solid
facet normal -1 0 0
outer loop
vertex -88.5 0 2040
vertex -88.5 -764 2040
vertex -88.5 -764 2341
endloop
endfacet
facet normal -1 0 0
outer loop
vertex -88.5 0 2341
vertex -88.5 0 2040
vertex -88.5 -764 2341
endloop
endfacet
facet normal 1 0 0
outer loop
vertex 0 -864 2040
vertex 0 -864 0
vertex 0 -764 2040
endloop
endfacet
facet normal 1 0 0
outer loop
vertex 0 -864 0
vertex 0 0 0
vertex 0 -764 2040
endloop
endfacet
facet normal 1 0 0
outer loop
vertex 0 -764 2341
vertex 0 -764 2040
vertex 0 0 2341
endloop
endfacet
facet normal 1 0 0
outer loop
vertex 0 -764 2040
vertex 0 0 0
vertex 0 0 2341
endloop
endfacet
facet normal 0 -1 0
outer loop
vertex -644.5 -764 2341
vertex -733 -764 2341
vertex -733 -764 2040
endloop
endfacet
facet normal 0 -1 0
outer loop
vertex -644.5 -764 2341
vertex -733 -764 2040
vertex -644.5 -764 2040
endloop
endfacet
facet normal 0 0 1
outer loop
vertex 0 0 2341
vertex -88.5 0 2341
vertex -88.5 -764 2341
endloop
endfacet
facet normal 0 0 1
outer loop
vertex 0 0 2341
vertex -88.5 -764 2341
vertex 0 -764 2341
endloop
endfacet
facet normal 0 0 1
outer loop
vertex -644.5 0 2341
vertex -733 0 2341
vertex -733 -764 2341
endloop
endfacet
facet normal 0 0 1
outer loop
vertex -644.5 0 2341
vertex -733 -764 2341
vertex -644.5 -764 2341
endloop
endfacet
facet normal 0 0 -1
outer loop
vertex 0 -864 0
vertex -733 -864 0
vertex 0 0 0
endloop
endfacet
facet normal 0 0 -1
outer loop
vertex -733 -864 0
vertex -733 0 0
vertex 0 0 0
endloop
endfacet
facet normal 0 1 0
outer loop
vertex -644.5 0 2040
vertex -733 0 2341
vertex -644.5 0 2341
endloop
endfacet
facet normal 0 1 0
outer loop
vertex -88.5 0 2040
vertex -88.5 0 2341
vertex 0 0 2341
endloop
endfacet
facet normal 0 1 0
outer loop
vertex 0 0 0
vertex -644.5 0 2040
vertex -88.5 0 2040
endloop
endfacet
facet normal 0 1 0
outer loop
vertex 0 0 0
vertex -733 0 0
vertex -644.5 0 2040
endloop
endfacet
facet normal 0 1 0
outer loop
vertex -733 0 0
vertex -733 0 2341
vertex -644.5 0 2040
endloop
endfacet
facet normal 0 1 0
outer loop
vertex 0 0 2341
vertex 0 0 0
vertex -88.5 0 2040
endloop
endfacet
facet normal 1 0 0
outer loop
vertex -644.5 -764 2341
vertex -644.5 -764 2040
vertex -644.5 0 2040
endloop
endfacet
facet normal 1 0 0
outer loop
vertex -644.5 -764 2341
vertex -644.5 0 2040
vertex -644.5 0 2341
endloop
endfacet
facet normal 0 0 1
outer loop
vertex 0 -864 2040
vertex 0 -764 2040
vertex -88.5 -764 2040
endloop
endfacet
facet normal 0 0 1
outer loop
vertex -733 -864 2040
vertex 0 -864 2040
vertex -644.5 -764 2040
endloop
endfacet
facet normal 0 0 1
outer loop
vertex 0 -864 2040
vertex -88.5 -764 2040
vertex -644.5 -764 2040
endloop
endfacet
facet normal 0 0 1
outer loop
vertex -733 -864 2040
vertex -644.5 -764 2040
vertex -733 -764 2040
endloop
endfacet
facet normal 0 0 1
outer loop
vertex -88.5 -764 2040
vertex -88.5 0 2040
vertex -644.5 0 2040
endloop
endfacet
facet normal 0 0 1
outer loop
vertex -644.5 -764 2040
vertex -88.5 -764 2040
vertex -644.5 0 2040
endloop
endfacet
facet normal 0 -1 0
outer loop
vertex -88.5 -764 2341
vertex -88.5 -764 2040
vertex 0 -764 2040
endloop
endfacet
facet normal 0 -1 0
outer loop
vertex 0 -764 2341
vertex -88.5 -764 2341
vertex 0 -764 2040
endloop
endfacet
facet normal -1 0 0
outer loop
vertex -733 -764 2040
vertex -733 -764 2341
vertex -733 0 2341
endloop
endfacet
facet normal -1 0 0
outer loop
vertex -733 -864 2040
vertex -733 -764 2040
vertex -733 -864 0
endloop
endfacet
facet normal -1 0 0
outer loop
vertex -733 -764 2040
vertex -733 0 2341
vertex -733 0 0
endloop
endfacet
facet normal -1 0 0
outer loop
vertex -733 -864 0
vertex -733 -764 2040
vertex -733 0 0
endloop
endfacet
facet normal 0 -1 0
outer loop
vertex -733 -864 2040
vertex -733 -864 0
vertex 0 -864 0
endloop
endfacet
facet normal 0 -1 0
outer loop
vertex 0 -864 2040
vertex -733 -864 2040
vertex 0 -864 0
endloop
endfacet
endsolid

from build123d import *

# Parameters (mm, degrees)
F0_W     = 733
F0_H     = 764
F1_DEPTH = 2341
F2_W     = 556
F2_H     = 301
F3_DEPTH = 764.001
F5_DEPTH = 100


with BuildPart() as f1:
    # F0 (on Top) → F1 (new body)
    with BuildSketch(Plane.XY):
        with Locations((-366.5, -382)):
            Rectangle(F0_W, F0_H)
    extrude(amount=F1_DEPTH)

    # F2 (on face) → F3 (cut, through all)
    with BuildSketch(Plane.XZ.offset(764)):
        with Locations((-366.5, 2190.5)):
            Rectangle(F2_W, F2_H)
    extrude(amount=-F3_DEPTH, mode=Mode.SUBTRACT)

    # F4 (on face) → F5 (join)
    with BuildSketch(Plane.XZ.offset(764)):
        Polygon((-733, 2040), (-733, 0), (0, 0), (0, 2040), (-88.5, 2040), (-644.5, 2040), align=None)
    extrude(amount=F5_DEPTH)


solid = f1.part
